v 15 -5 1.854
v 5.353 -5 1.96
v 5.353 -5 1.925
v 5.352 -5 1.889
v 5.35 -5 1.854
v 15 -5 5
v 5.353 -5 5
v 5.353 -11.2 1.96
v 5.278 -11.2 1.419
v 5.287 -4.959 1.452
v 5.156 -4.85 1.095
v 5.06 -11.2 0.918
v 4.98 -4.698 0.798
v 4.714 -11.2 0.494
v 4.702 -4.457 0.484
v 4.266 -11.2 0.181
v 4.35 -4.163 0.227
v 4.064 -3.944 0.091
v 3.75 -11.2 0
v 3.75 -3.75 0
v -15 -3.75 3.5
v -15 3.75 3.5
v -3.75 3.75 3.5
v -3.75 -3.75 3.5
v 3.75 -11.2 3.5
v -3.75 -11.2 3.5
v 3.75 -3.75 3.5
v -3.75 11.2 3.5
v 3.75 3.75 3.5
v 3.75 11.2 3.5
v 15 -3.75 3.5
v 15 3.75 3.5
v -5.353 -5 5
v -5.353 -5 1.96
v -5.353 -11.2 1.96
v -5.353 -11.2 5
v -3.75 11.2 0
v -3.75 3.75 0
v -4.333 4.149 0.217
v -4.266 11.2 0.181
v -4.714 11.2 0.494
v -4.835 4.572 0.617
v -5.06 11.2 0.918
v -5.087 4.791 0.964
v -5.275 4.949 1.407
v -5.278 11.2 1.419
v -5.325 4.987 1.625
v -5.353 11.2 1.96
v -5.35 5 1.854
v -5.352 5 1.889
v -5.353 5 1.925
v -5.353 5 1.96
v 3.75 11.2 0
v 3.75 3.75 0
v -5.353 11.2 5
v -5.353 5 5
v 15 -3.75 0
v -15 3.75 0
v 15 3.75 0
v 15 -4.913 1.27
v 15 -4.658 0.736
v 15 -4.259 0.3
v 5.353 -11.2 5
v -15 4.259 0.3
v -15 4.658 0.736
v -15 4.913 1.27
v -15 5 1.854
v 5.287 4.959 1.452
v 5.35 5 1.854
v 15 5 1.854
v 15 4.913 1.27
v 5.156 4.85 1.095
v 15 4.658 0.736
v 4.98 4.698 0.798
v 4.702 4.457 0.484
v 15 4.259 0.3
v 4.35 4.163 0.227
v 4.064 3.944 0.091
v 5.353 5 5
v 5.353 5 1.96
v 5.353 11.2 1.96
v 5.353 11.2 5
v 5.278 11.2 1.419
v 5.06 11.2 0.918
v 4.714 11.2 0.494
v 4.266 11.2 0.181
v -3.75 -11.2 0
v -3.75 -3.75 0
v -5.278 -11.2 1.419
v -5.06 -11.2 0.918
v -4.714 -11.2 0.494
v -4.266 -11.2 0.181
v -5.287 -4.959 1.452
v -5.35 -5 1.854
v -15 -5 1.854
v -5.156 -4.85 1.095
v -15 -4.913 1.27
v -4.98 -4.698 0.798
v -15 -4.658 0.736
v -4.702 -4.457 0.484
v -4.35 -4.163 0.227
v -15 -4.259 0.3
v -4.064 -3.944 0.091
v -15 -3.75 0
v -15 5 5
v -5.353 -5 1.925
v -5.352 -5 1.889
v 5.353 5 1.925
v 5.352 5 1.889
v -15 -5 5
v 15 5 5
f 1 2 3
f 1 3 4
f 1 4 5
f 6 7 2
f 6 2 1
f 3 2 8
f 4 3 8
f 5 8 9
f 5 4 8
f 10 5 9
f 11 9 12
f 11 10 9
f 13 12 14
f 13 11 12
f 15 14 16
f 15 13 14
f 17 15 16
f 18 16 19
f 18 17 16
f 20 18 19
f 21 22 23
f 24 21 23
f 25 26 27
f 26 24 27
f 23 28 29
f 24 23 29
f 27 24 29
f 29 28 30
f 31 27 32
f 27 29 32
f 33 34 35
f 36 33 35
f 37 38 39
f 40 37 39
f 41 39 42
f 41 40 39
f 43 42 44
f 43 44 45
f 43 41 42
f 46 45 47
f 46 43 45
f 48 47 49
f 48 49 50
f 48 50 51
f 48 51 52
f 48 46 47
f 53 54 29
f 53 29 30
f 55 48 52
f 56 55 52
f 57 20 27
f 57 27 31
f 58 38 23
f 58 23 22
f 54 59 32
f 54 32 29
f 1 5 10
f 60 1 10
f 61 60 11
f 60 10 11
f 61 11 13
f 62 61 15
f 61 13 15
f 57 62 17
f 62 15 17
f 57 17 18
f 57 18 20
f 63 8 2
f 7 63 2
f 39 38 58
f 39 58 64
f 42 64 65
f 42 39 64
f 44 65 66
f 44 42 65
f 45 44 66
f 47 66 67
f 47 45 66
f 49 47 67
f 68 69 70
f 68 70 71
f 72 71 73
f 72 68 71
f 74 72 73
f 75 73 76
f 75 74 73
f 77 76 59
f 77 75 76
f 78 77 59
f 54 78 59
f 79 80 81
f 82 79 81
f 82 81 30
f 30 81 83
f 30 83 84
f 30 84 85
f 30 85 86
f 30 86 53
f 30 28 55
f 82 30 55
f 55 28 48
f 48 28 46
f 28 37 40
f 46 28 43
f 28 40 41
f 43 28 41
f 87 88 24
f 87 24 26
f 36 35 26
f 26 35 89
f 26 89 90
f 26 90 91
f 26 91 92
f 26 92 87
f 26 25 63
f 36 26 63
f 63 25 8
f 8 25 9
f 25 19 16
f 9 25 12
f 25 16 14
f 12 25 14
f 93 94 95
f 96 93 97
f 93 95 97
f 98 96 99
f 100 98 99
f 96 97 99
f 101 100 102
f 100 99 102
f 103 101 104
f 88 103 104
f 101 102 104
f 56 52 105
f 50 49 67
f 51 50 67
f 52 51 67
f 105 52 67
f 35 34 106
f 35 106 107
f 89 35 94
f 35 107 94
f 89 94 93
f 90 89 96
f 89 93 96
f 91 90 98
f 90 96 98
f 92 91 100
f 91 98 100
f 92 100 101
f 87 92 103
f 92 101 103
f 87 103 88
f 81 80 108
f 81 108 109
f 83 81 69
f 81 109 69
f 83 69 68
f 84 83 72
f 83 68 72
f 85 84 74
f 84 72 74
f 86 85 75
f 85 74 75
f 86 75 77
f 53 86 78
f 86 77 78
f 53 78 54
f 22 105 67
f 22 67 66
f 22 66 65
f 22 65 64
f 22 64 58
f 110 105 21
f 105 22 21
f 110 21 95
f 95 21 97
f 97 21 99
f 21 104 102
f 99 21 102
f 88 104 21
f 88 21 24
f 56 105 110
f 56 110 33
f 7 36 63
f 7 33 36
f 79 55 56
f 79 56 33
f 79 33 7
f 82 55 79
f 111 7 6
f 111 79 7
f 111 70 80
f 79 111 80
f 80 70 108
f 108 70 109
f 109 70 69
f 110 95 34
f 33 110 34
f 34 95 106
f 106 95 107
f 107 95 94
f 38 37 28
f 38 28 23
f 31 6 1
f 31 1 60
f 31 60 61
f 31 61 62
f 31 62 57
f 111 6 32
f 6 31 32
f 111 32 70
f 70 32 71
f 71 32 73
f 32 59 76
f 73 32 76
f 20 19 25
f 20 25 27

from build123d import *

# Parameters (mm, degrees)
F2_DEPTH     = 5
F3_DEPTH     = 3.5
F4_T1_DEPTH  = 14.2822071908
F4_T3_DEPTH  = 11.1004623397
F4_T5_DEPTH  = 14.2822071908
F4_T7_DEPTH  = 11.1004623397
F4_T13_DEPTH = 11.1004623397
F4_T18_DEPTH = 14.2822071908
F4_T26_DEPTH = 14.2822071908
F4_T31_DEPTH = 11.1004623397
F4_T39_DEPTH = 14.2822071908
F4_T44_DEPTH = 11.1004623397
F4_T52_DEPTH = 11.1004623397
F4_T57_DEPTH = 14.2822071908


# Not quite as in the source:
# - a fillet or chamfer that OpenCascade refuses, or shapes differently, is made with other operations: its cross-section is extruded or revolved along the edge and cut away or added


with BuildPart() as f2:
    # F1 (on Top) → F2 (new body)
    with BuildSketch(Plane.XY):
        Polygon((-5.3529168636, -11.2), (5.3529168636, -11.2), (5.3529168636, -5), (15, -5), (15, 5), (5.3529168636, 5), (5.3529168636, 11.2), (-5.3529168636, 11.2), (-5.3529168636, 5), (-15, 5), (-15, -5), (-5.3529168636, -5), align=None)
    extrude(amount=F2_DEPTH)

    # F0 (on Top) → F3 (cut)
    with BuildSketch(Plane.XY):
        Polygon((-3.75, -11.2), (3.75, -11.2), (3.75, -3.75), (15, -3.75), (15, 3.75), (3.75, 3.75), (3.75, 11.2), (-3.75, 11.2), (-3.75, 3.75), (-15, 3.75), (-15, -3.75), (-3.75, -3.75), align=None)
    extrude(amount=F3_DEPTH, mode=Mode.SUBTRACT)

    # F4: fillet of radius 2 on 8 edges, made by hand

    # F4_s2 → F4_t1 (cut)
    with BuildSketch(Plane.YZ.offset(5.3529168636)):
        with BuildLine():
            ThreePointArc((5, 1.8540496218), (4.6583123952, 0.736015633), (3.75, 0))
            Line((3.75, 0), (5, 0))
            Line((5, 0), (5, 1.8540496218))
        make_face()
        with BuildLine():
            ThreePointArc((-5, 1.8540496218), (-4.6583123952, 0.736015633), (-3.75, 0))
            Line((-3.75, 0), (-5, 0))
            Line((-5, 0), (-5, 1.8540496218))
        make_face()
    extrude(amount=F4_T1_DEPTH, mode=Mode.SUBTRACT)

    # F4_s4 → F4_t3 (cut)
    with BuildSketch(Plane.XZ.offset(-16.1004623397)):
        with BuildLine():
            ThreePointArc((-3.75, 0), (-4.9011685022, 0.6941214052), (-5.3529168636, 1.9601849359))
            Line((-5.3529168636, 1.9601849359), (-5.3529168636, 0))
            Line((-5.3529168636, 0), (-3.75, 0))
        make_face()
        with BuildLine():
            ThreePointArc((5.3529168636, 1.9601849359), (4.9011685022, 0.6941214052), (3.75, 0))
            Line((3.75, 0), (5.3529168636, 0))
            Line((5.3529168636, 0), (5.3529168636, 1.9601849359))
        make_face()
    extrude(amount=F4_T3_DEPTH, mode=Mode.SUBTRACT)

    # F4_s6 → F4_t5 (cut)
    with BuildSketch(Plane.YZ.offset(-19.6351240544)):
        with BuildLine():
            ThreePointArc((3.75, 0), (4.6583123952, 0.736015633), (5, 1.8540496218))
            Line((5, 1.8540496218), (5, 0))
            Line((5, 0), (3.75, 0))
        make_face()
        with BuildLine():
            ThreePointArc((-5, 1.8540496218), (-4.6583123952, 0.736015633), (-3.75, 0))
            Line((-3.75, 0), (-5, 0))
            Line((-5, 0), (-5, 1.8540496218))
        make_face()
    extrude(amount=F4_T5_DEPTH, mode=Mode.SUBTRACT)

    # F4_s8 → F4_t7 (cut)
    with BuildSketch(Plane.XZ.offset(5)):
        with BuildLine():
            ThreePointArc((-5.3529168636, 1.9601849359), (-4.9011685022, 0.6941214052), (-3.75, 0))
            Line((-3.75, 0), (-5.3529168636, 0))
            Line((-5.3529168636, 0), (-5.3529168636, 1.9601849359))
        make_face()
        with BuildLine():
            ThreePointArc((5.3529168636, 1.9601849359), (4.9011685022, 0.6941214052), (3.75, 0))
            Line((3.75, 0), (5.3529168636, 0))
            Line((5.3529168636, 0), (5.3529168636, 1.9601849359))
        make_face()
    extrude(amount=F4_T7_DEPTH, mode=Mode.SUBTRACT)


with BuildPart() as f4_tool11:
    # F4_s12 → F4_t13 (new body)
    with BuildSketch(Plane.XZ.offset(-0.0995376603)):
        with BuildLine():
            ThreePointArc((5.3529168636, 1.9601849359), (4.9011685022, 0.6941214052), (3.75, 0))
            Line((3.75, 0), (5.3529168636, 0))
            Line((5.3529168636, 0), (5.3529168636, 1.9601849359))
        make_face()
    extrude(amount=-F4_T13_DEPTH)

    split(bisect_by=Plane.XZ.offset(-5), keep=Keep.TOP)

    split(bisect_by=Plane.XZ.offset(-3.75), keep=Keep.BOTTOM)


with BuildPart() as f4_tool16:
    # F4_s17 → F4_t18 (new body)
    with BuildSketch(Plane.YZ.offset(15)):
        with BuildLine():
            ThreePointArc((5, 1.8540496218), (4.6583123952, 0.736015633), (3.75, 0))
            Line((3.75, 0), (5, 0))
            Line((5, 0), (5, 1.8540496218))
        make_face()
    extrude(amount=-F4_T18_DEPTH)

    split(bisect_by=Plane.YZ.offset(5.3529168636), keep=Keep.BOTTOM)

    split(bisect_by=Plane.YZ.offset(3.75), keep=Keep.TOP)


with BuildPart() as f4_tool11_1:
    add(f4_tool11.part)

    # F4_t21: intersect F4_tool16
    add(f4_tool16.part, mode=Mode.INTERSECT)


with BuildPart() as f2_1:
    add(f2.part)

    # F4_t9: cut F4_tool11
    add(f4_tool11_1.part, mode=Mode.SUBTRACT)


with BuildPart() as f4_tool24:
    # F4_s25 → F4_t26 (new body)
    with BuildSketch(Plane.YZ.offset(-0.7177928092)):
        with BuildLine():
            ThreePointArc((3.75, 0), (4.6583123952, 0.736015633), (5, 1.8540496218))
            Line((5, 1.8540496218), (5, 0))
            Line((5, 0), (3.75, 0))
        make_face()
    extrude(amount=-F4_T26_DEPTH)

    split(bisect_by=Plane.YZ.offset(-3.75), keep=Keep.BOTTOM)

    split(bisect_by=Plane.YZ.offset(-5.3529168636), keep=Keep.TOP)


with BuildPart() as f4_tool29:
    # F4_s30 → F4_t31 (new body)
    with BuildSketch(Plane.XZ.offset(-11.2)):
        with BuildLine():
            ThreePointArc((-3.75, 0), (-4.9011685022, 0.6941214052), (-5.3529168636, 1.9601849359))
            Line((-5.3529168636, 1.9601849359), (-5.3529168636, 0))
            Line((-5.3529168636, 0), (-3.75, 0))
        make_face()
    extrude(amount=F4_T31_DEPTH)

    split(bisect_by=Plane.XZ.offset(-5), keep=Keep.TOP)

    split(bisect_by=Plane.XZ.offset(-3.75), keep=Keep.BOTTOM)


with BuildPart() as f4_tool24_1:
    add(f4_tool24.part)

    # F4_t34: intersect F4_tool29
    add(f4_tool29.part, mode=Mode.INTERSECT)


with BuildPart() as f2_2:
    add(f2_1.part)

    # F4_t22: cut F4_tool24
    add(f4_tool24_1.part, mode=Mode.SUBTRACT)


with BuildPart() as f4_tool37:
    # F4_s38 → F4_t39 (new body)
    with BuildSketch(Plane.YZ.offset(-15)):
        with BuildLine():
            ThreePointArc((-5, 1.8540496218), (-4.6583123952, 0.736015633), (-3.75, 0))
            Line((-3.75, 0), (-5, 0))
            Line((-5, 0), (-5, 1.8540496218))
        make_face()
    extrude(amount=F4_T39_DEPTH)

    split(bisect_by=Plane.YZ.offset(-5.3529168636), keep=Keep.TOP)

    split(bisect_by=Plane.YZ.offset(-3.75), keep=Keep.BOTTOM)


with BuildPart() as f4_tool42:
    # F4_s43 → F4_t44 (new body)
    with BuildSketch(Plane.XZ.offset(0.0995376603)):
        with BuildLine():
            ThreePointArc((-5.3529168636, 1.9601849359), (-4.9011685022, 0.6941214052), (-3.75, 0))
            Line((-3.75, 0), (-5.3529168636, 0))
            Line((-5.3529168636, 0), (-5.3529168636, 1.9601849359))
        make_face()
    extrude(amount=F4_T44_DEPTH)

    split(bisect_by=Plane.XZ.offset(5), keep=Keep.BOTTOM)

    split(bisect_by=Plane.XZ.offset(3.75), keep=Keep.TOP)


with BuildPart() as f4_tool37_1:
    add(f4_tool37.part)

    # F4_t47: intersect F4_tool42
    add(f4_tool42.part, mode=Mode.INTERSECT)


with BuildPart() as f2_3:
    add(f2_2.part)

    # F4_t35: cut F4_tool37
    add(f4_tool37_1.part, mode=Mode.SUBTRACT)


with BuildPart() as f4_tool50:
    # F4_s51 → F4_t52 (new body)
    with BuildSketch(Plane.XZ.offset(11.2)):
        with BuildLine():
            ThreePointArc((5.3529168636, 1.9601849359), (4.9011685022, 0.6941214052), (3.75, 0))
            Line((3.75, 0), (5.3529168636, 0))
            Line((5.3529168636, 0), (5.3529168636, 1.9601849359))
        make_face()
    extrude(amount=-F4_T52_DEPTH)

    split(bisect_by=Plane.XZ.offset(5), keep=Keep.BOTTOM)

    split(bisect_by=Plane.XZ.offset(3.75), keep=Keep.TOP)


with BuildPart() as f4_tool55:
    # F4_s56 → F4_t57 (new body)
    with BuildSketch(Plane.YZ.offset(0.7177928092)):
        with BuildLine():
            ThreePointArc((-5, 1.8540496218), (-4.6583123952, 0.736015633), (-3.75, 0))
            Line((-3.75, 0), (-5, 0))
            Line((-5, 0), (-5, 1.8540496218))
        make_face()
    extrude(amount=F4_T57_DEPTH)

    split(bisect_by=Plane.YZ.offset(5.3529168636), keep=Keep.BOTTOM)

    split(bisect_by=Plane.YZ.offset(3.75), keep=Keep.TOP)


with BuildPart() as f4_tool50_1:
    add(f4_tool50.part)

    # F4_t60: intersect F4_tool55
    add(f4_tool55.part, mode=Mode.INTERSECT)


with BuildPart() as f2_4:
    add(f2_3.part)

    # F4_t48: cut F4_tool50
    add(f4_tool50_1.part, mode=Mode.SUBTRACT)


solid = f2_4.part
